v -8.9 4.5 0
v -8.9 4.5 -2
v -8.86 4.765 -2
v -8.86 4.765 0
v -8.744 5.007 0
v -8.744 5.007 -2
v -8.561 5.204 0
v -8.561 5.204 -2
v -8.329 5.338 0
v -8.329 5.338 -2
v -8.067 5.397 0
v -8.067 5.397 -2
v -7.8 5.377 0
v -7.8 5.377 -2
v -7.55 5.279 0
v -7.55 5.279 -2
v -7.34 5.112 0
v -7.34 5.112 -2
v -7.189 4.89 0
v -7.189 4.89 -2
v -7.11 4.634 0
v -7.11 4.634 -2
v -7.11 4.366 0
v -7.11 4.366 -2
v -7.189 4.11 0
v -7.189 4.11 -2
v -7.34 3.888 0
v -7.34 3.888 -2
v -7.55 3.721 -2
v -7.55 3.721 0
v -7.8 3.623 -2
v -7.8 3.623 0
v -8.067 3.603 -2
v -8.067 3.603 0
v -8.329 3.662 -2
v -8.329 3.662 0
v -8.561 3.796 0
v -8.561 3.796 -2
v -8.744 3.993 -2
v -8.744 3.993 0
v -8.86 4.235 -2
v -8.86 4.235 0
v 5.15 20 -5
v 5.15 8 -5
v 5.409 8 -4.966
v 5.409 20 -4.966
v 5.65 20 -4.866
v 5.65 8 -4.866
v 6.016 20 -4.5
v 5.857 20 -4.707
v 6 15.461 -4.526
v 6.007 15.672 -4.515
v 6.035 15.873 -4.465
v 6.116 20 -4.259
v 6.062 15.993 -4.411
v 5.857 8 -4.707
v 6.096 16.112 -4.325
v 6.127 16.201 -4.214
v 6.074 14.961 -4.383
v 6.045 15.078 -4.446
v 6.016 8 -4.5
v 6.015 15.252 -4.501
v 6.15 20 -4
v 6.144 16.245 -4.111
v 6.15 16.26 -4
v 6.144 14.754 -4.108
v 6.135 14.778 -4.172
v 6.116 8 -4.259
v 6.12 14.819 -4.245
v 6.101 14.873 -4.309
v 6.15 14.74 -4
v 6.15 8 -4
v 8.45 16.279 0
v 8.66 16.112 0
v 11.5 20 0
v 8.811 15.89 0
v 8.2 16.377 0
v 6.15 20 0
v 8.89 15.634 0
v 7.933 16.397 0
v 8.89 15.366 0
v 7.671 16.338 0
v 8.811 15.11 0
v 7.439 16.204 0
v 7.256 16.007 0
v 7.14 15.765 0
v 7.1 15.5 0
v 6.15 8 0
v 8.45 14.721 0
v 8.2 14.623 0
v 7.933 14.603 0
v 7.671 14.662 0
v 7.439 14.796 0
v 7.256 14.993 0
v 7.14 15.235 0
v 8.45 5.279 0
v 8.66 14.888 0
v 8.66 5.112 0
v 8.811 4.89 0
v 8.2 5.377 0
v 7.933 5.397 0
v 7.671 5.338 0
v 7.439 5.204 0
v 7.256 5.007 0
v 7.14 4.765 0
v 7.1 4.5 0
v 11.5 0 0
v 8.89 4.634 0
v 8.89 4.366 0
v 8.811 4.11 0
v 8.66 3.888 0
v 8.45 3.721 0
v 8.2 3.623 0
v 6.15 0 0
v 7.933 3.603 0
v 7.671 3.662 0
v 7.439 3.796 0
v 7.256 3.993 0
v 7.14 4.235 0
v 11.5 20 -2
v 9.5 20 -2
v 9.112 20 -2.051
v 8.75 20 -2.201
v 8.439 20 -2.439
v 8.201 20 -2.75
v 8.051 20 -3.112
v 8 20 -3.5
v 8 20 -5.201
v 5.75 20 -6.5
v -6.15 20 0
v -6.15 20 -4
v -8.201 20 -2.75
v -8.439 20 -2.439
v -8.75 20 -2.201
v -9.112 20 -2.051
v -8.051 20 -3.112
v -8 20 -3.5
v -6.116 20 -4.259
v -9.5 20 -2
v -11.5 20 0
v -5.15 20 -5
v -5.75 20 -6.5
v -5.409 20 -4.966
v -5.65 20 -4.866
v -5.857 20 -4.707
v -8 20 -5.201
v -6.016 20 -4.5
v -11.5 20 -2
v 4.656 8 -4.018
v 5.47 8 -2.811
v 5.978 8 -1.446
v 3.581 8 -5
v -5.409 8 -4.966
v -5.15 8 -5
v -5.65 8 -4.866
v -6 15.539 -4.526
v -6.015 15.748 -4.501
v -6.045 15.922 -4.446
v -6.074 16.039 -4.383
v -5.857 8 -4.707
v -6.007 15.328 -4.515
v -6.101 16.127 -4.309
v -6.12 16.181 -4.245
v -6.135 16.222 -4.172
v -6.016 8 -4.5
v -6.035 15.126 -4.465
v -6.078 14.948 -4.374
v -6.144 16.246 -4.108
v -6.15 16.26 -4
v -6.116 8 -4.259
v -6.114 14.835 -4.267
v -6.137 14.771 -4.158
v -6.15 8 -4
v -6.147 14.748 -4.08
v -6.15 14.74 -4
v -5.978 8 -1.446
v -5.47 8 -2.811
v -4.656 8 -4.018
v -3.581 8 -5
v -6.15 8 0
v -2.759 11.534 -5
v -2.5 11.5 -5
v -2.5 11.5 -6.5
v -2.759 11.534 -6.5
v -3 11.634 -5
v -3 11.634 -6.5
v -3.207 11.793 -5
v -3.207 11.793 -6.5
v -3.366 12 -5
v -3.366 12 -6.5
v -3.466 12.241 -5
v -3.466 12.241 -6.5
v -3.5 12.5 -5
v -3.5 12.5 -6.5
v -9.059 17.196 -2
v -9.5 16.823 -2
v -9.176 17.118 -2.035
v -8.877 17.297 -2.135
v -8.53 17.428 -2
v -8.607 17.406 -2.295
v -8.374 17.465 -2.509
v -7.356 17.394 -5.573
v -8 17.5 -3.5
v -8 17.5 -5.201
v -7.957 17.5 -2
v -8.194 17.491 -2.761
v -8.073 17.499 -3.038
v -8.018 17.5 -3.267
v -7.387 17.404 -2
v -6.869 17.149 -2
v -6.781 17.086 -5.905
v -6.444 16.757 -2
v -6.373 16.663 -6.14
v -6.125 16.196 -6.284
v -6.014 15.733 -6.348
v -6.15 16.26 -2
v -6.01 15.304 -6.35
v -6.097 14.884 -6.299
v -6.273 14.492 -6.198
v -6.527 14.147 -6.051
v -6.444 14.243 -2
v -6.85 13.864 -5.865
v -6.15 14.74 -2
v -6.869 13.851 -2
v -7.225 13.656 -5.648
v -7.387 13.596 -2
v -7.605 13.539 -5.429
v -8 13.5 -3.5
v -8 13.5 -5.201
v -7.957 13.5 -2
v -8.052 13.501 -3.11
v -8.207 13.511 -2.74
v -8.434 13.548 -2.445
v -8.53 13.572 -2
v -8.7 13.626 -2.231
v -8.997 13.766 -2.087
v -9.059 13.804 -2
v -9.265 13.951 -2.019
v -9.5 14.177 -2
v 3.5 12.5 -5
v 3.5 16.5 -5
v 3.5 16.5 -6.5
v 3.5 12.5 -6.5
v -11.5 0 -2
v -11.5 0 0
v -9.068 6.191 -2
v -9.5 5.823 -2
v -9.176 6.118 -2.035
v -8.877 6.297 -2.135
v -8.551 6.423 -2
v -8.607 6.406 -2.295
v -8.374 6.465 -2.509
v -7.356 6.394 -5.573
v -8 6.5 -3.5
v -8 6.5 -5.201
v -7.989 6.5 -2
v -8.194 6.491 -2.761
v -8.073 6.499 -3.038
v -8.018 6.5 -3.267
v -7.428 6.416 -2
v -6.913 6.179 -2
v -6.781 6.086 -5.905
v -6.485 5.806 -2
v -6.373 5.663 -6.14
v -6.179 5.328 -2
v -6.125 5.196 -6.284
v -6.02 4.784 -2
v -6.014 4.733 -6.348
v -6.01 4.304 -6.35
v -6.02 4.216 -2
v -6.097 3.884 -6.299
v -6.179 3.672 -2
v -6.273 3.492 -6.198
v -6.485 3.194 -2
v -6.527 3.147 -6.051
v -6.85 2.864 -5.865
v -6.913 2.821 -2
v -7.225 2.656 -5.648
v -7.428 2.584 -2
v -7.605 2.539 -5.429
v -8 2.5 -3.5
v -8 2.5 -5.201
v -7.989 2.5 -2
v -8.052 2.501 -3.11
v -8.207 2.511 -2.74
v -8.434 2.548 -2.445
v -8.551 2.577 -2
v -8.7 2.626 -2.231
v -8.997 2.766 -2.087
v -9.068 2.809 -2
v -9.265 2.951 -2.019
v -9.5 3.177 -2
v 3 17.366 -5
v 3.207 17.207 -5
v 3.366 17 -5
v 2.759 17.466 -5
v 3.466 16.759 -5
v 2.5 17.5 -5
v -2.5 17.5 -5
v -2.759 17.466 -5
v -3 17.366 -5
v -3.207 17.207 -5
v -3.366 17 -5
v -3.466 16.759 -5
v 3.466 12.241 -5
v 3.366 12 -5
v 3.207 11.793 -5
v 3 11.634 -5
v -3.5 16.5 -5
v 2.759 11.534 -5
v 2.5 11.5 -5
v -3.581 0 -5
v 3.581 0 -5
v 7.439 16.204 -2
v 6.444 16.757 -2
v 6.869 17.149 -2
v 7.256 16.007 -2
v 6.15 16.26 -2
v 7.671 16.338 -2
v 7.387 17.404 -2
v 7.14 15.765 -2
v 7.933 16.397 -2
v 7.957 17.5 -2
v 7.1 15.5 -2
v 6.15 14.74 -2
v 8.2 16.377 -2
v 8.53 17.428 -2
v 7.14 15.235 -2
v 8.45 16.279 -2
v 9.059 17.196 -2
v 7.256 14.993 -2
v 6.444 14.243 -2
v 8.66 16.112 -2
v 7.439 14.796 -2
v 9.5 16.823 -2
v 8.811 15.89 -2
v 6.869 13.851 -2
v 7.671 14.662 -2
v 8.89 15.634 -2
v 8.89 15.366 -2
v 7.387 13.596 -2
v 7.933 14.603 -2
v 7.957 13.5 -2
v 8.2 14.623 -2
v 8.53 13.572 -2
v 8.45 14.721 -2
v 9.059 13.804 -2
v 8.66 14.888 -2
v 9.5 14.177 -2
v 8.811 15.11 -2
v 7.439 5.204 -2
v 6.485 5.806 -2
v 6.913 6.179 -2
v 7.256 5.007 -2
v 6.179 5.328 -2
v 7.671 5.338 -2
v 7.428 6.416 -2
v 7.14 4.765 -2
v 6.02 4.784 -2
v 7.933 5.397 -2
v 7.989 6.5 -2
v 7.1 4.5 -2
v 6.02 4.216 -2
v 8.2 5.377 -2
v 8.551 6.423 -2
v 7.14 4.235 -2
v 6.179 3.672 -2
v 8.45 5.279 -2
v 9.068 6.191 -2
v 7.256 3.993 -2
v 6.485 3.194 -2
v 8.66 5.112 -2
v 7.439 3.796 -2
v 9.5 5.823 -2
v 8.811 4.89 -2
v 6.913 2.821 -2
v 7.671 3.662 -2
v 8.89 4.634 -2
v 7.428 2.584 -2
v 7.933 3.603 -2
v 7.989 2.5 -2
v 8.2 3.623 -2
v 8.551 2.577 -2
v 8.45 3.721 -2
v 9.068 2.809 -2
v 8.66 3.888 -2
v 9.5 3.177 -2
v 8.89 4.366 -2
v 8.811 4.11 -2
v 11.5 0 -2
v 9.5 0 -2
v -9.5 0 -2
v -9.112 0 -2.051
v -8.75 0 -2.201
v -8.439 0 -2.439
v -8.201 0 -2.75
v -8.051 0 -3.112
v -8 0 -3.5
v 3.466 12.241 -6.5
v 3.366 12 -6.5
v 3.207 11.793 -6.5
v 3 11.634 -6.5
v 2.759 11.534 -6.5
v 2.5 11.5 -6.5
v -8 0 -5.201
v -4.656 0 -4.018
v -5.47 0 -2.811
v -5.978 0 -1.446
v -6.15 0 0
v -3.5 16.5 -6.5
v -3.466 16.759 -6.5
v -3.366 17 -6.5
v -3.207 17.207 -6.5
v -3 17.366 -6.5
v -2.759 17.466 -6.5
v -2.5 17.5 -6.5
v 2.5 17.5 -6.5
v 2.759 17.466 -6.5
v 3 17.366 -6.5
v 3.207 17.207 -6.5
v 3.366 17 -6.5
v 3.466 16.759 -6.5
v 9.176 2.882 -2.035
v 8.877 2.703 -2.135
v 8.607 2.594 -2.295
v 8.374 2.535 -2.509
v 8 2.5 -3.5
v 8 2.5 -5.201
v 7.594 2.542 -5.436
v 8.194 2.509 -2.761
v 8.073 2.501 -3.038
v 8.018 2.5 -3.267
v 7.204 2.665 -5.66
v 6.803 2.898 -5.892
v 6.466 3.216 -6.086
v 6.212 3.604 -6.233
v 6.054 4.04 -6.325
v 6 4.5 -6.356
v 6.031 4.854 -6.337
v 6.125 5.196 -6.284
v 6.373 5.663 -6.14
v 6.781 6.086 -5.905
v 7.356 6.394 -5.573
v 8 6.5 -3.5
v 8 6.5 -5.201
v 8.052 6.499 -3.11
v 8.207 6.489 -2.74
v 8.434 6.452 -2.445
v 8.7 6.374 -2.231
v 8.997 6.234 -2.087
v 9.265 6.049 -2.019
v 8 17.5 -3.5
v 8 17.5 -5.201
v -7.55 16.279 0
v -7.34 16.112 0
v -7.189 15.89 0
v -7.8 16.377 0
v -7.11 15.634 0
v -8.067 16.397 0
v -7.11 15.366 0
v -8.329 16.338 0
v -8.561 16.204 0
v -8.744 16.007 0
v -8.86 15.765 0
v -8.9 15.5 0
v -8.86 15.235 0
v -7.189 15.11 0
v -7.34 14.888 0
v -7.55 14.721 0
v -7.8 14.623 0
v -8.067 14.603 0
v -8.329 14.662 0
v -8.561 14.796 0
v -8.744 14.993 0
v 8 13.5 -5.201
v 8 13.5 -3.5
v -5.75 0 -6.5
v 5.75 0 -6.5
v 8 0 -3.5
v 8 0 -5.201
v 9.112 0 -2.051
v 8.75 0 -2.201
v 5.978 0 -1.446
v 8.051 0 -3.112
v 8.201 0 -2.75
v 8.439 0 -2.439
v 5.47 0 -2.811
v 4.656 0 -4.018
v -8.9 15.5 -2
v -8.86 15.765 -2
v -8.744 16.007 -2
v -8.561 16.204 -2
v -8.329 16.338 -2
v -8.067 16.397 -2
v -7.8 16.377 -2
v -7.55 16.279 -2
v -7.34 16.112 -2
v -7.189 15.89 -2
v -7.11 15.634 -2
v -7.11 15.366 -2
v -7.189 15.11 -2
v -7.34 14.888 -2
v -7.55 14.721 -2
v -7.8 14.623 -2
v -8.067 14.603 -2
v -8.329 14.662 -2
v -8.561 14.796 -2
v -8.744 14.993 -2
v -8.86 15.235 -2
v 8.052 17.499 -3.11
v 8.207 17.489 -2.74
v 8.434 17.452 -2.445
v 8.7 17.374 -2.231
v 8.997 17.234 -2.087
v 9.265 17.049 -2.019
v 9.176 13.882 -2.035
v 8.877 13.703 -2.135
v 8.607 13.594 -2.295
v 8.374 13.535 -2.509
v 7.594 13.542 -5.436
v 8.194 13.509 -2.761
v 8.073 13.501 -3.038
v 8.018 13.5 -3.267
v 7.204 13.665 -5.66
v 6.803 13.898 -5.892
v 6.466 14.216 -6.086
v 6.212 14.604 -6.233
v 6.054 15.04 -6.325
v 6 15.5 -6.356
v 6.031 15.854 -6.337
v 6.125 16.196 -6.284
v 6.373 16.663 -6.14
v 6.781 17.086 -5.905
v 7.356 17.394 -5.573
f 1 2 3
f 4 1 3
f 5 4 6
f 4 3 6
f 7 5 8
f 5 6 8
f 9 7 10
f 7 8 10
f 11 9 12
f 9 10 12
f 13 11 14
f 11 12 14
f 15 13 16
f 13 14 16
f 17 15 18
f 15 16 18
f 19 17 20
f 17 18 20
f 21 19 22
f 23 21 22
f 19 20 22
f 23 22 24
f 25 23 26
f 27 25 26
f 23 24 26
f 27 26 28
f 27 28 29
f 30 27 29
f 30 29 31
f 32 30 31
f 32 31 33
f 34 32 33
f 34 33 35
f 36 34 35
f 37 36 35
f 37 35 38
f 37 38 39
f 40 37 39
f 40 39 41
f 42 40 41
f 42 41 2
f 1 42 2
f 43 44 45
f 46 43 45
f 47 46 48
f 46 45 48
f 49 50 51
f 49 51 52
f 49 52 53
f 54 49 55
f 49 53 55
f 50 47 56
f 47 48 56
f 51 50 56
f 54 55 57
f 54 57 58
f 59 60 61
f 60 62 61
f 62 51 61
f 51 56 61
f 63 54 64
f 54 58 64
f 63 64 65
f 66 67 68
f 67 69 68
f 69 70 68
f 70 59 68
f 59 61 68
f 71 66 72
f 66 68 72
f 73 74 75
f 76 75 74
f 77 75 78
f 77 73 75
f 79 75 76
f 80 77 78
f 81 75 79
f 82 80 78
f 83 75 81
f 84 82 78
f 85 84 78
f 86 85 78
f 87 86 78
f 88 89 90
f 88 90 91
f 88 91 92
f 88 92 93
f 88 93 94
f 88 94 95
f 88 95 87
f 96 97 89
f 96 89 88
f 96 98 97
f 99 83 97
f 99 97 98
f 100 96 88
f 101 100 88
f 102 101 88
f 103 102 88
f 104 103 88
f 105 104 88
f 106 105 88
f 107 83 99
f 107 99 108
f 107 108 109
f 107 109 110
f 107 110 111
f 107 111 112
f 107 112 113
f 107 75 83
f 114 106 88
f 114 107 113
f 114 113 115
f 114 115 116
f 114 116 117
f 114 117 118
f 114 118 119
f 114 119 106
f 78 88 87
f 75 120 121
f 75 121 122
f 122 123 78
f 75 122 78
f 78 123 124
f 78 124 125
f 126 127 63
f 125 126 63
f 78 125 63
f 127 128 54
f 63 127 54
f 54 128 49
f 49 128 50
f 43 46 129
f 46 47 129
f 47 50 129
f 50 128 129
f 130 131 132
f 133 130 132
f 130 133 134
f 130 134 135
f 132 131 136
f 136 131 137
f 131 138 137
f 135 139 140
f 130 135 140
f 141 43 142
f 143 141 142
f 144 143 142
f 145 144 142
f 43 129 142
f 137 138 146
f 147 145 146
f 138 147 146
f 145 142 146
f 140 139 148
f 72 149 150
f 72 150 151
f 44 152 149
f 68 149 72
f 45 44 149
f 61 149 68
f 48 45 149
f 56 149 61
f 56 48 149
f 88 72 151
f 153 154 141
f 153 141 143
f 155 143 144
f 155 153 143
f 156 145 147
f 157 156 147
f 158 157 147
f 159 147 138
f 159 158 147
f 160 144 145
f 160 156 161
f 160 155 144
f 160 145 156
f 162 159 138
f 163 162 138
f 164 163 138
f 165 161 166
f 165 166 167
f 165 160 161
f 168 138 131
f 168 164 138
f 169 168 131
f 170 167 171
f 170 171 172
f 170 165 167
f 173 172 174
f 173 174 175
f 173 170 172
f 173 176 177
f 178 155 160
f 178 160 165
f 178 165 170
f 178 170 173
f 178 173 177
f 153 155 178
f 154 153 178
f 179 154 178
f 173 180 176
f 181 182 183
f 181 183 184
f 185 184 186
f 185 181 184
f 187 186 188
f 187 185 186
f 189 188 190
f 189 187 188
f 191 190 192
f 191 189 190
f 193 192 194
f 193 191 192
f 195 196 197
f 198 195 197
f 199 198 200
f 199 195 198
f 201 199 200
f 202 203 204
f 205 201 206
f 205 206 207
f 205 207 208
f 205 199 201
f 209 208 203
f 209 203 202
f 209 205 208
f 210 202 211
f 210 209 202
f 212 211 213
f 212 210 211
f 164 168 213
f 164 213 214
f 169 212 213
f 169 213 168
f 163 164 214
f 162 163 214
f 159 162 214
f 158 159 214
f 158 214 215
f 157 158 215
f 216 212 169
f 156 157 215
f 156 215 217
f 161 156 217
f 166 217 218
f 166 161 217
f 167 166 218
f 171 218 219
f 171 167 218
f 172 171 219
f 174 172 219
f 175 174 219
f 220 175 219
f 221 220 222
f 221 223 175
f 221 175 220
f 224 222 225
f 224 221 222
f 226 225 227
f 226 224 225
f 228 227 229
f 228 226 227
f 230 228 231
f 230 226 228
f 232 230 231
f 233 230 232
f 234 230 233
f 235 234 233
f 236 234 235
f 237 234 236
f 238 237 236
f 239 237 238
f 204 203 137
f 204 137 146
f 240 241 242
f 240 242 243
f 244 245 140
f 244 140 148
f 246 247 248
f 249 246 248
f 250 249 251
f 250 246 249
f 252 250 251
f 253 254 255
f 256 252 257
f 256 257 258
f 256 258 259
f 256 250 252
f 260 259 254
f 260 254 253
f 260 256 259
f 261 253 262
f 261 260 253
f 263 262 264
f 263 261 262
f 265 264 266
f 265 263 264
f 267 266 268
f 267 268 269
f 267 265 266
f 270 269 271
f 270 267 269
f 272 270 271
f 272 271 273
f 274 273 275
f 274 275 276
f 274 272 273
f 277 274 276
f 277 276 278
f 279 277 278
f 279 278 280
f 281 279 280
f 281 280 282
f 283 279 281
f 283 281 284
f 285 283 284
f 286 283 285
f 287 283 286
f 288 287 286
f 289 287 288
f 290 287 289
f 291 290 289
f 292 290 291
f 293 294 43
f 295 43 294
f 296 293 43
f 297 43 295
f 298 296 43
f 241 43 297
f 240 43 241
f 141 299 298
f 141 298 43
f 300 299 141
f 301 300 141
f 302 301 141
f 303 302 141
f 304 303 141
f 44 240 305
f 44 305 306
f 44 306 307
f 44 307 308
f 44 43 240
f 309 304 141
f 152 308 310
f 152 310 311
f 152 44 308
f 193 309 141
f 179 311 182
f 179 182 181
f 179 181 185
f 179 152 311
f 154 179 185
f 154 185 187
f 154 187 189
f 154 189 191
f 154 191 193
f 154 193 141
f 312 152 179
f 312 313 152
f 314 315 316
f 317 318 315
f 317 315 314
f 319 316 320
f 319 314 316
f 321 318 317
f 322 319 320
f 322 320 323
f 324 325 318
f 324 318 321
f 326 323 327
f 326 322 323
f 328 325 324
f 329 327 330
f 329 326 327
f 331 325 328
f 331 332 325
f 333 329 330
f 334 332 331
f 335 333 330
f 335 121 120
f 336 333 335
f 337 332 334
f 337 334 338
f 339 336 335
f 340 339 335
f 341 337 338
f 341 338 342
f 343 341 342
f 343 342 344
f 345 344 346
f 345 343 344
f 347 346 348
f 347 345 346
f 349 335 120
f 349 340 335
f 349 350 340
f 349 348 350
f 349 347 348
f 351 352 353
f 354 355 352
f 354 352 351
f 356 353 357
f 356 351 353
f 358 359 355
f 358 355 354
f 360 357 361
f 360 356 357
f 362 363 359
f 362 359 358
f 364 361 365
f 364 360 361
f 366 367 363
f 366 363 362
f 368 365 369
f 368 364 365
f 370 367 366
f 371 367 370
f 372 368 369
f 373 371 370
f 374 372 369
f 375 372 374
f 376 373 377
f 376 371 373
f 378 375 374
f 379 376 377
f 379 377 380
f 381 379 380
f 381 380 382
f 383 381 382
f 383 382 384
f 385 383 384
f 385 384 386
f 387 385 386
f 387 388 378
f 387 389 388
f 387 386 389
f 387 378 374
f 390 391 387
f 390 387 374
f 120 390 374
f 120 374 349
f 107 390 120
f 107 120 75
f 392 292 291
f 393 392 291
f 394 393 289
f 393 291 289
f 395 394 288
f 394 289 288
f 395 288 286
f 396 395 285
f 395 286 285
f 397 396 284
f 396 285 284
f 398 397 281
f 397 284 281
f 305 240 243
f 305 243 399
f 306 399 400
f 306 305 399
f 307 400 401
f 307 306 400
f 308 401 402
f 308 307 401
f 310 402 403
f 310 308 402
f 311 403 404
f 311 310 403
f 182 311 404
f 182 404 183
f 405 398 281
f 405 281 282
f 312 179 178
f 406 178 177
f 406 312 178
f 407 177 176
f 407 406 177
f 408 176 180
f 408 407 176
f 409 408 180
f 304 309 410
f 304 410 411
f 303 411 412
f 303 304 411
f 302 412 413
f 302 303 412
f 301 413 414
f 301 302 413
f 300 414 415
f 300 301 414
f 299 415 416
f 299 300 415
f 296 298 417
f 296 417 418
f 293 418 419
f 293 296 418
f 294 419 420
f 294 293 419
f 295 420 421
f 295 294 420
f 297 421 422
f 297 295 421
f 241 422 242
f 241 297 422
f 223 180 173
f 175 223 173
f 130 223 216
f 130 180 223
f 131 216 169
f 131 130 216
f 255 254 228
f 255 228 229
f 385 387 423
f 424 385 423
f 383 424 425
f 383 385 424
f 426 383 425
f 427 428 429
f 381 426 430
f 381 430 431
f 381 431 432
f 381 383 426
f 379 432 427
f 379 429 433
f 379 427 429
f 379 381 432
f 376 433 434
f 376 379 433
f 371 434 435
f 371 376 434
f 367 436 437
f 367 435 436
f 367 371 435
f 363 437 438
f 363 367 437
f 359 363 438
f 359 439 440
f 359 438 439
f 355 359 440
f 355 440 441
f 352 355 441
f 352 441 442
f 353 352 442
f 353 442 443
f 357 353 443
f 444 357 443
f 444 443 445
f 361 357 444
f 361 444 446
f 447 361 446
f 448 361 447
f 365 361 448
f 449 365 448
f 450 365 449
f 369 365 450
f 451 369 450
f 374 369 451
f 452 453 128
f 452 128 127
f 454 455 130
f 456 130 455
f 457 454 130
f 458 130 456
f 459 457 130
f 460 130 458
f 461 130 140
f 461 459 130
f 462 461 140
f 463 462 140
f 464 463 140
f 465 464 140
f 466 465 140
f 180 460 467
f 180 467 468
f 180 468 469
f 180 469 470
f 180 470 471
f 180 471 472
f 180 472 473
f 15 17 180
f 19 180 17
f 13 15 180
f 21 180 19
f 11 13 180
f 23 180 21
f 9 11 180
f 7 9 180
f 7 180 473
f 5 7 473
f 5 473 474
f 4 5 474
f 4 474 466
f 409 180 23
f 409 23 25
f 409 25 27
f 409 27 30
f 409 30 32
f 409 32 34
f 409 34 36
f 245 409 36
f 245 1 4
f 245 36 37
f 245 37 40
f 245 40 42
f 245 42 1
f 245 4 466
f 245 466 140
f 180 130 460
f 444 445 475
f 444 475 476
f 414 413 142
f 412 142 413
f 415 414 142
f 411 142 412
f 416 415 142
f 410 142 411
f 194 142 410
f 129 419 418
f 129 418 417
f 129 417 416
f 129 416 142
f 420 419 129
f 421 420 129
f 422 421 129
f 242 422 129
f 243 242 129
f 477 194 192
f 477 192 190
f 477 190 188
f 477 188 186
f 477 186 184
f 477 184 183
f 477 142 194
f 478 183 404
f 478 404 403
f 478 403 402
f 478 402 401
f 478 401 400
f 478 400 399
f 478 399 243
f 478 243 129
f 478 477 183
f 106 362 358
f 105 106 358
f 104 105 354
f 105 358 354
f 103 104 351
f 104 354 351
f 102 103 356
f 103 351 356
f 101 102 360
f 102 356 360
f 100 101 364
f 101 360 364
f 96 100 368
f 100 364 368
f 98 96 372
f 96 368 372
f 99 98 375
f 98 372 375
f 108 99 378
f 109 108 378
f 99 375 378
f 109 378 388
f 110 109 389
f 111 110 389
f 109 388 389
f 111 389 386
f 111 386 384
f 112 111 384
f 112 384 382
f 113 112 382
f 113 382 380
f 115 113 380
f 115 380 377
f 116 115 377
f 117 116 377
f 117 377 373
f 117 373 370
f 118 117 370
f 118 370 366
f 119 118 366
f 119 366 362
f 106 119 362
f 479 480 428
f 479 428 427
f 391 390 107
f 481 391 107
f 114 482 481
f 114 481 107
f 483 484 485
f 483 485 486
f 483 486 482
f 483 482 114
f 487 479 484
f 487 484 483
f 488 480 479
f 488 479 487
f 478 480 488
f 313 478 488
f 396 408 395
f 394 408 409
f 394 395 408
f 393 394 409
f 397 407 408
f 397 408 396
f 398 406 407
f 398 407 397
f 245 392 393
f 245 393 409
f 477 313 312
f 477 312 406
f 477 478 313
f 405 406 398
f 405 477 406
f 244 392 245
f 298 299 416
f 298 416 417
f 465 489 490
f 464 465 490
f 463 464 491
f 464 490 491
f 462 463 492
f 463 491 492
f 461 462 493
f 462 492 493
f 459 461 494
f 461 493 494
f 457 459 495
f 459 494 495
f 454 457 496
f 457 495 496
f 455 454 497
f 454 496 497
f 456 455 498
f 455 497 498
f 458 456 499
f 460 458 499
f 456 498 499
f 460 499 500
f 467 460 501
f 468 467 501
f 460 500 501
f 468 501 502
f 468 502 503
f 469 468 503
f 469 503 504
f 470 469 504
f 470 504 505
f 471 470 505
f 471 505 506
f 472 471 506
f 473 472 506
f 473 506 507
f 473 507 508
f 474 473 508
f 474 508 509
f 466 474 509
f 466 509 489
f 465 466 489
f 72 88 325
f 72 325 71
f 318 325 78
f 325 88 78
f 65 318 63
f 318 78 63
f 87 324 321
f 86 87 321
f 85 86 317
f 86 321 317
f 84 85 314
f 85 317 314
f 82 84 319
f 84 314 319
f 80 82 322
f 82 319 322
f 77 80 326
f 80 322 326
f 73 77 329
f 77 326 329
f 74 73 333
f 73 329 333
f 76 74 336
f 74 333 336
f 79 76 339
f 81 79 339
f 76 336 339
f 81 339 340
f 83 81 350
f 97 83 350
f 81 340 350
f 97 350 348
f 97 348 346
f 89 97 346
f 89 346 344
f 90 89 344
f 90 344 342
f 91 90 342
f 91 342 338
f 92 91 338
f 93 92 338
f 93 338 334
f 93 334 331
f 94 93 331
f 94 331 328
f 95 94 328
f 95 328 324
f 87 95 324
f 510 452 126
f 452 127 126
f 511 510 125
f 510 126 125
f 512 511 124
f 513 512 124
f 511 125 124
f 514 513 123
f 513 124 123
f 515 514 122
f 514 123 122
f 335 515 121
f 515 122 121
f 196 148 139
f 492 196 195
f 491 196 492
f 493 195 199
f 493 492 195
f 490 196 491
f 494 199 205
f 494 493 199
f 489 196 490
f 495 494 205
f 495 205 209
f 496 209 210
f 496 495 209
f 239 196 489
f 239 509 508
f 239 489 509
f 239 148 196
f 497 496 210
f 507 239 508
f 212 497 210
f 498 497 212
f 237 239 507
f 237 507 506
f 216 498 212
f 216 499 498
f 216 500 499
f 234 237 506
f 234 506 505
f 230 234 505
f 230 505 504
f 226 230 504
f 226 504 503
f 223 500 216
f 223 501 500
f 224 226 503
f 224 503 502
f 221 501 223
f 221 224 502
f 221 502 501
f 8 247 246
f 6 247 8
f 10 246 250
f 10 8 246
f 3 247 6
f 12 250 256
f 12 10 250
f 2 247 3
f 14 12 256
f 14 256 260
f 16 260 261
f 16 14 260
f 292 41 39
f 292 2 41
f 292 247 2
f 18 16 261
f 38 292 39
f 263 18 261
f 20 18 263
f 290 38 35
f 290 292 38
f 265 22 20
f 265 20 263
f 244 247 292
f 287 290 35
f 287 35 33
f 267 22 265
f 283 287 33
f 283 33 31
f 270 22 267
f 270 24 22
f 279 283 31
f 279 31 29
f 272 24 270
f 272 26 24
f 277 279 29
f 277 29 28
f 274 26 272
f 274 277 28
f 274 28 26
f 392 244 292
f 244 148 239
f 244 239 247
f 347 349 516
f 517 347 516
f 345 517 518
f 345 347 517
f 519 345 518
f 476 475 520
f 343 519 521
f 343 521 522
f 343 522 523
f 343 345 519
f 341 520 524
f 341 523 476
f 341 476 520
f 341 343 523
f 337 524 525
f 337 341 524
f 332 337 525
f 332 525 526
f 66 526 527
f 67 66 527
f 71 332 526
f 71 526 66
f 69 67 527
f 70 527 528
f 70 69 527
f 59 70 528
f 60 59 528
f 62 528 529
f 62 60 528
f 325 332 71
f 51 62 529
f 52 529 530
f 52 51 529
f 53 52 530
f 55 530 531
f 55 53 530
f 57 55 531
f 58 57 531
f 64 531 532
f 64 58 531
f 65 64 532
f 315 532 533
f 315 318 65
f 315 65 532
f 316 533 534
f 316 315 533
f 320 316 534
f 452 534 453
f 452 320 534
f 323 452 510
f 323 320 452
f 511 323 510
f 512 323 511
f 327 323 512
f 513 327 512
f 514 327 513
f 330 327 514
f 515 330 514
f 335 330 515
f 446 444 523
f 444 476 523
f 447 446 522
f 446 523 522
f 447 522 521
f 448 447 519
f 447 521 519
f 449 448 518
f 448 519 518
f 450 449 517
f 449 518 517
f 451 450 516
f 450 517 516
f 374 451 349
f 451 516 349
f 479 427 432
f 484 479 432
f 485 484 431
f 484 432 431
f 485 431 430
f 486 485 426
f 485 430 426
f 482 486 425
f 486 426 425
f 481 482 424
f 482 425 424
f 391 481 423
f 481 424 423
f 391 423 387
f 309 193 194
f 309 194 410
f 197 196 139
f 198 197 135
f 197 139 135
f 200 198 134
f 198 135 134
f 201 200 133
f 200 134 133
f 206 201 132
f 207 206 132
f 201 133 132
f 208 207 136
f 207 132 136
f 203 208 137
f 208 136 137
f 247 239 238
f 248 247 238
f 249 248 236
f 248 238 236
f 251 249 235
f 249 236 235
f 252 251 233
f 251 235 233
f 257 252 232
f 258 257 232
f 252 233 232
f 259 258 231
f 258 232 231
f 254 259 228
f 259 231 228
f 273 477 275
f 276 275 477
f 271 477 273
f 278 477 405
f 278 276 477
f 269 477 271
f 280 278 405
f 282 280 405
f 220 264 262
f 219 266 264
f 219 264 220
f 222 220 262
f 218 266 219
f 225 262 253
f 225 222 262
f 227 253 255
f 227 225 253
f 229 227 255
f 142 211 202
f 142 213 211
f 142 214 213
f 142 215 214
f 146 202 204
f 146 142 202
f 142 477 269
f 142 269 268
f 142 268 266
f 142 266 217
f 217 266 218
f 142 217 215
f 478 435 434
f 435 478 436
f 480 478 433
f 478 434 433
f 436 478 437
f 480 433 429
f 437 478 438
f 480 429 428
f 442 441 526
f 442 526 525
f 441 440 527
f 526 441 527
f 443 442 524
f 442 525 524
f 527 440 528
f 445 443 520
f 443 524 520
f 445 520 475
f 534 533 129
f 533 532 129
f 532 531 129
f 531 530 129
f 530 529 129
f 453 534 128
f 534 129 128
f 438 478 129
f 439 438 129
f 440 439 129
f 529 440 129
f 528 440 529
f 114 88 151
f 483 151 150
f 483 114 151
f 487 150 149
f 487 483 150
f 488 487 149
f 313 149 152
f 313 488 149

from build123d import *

# Parameters (mm, degrees)
EXTRUDE_1_DEPTH     = 20
SKETCH_2_W          = 12.3
SKETCH_2_H          = 5
CUT_EXTRUDE_1_DEPTH = 12
FILLET_1_R          = 1
FILLET_2_R          = 1.5
CUT_EXTRUDE_5_DEPTH = 21
SKETCH_3_R          = 0.9
CUT_EXTRUDE_2_DEPTH = 8
SKETCH_4_R          = 2
CUT_EXTRUDE_3_DEPTH = 8
CUT_EXTRUDE_4_DEPTH = 8


with BuildPart() as part:
    # 草图1 → 凸台-拉伸1 (new body)
    with BuildSketch(Plane(origin=(0, 0, 0), x_dir=(1, 0, 0), z_dir=(0, 1, 0))):
        with BuildLine():
            Line((-6.15, 0), (-11.5, 0))
            Line((-11.5, 0), (-11.5, 2))
            Line((-11.5, 2), (-8, 2))
            Line((-8, 2), (-8, 6.5))
            Line((-8, 6.5), (8, 6.5))
            Line((8, 6.5), (8, 2))
            Line((8, 2), (11.5, 2))
            Line((11.5, 2), (11.5, 0))
            Line((11.5, 0), (6.15, 0))
            ThreePointArc((6.15, 0), (5.470134317, 2.810717088), (3.580851854, 5))
            Line((3.580851854, 5), (-3.580851854, 5))
            ThreePointArc((-3.580851854, 5), (-5.470134317, 2.810717088), (-6.15, 0))
        make_face()
    extrude(amount=EXTRUDE_1_DEPTH)

    # 草图2 → 切除-拉伸1 (cut)
    with BuildSketch(Plane(origin=(0, 20, 0), x_dir=(1, 0, 0), z_dir=(0, 1, 0))):
        with Locations((0, 2.5)):
            Rectangle(SKETCH_2_W, SKETCH_2_H)
    extrude(amount=-CUT_EXTRUDE_1_DEPTH, mode=Mode.SUBTRACT)

    # 圆角1
    fillet_1_edges = [part.edges().sort_by_distance(p)[0] for p in [
        (-6.15, 14, -5),
        (6.15, 14, -5),
    ]]
    fillet(fillet_1_edges, radius=FILLET_1_R)

    # 圆角2
    fillet_2_edges = [part.edges().sort_by_distance(p)[0] for p in [
        (-8, 10, -2),
        (8, 10, -2),
    ]]
    fillet(fillet_2_edges, radius=FILLET_2_R)

    # 草图6 → 切除-拉伸5 (cut, through all)
    with BuildSketch(Plane(origin=(0, 20, 0), x_dir=(1, 0, 0), z_dir=(0, 1, 0))):
        Polygon((-5.75, 6.5), (-8.528510242, 4.895826364), (-8.528510242, 6.5), align=None)
        Polygon((8.528510242, 6.5), (5.75, 6.5), (8.528510242, 4.895826364), align=None)
    extrude(amount=-CUT_EXTRUDE_5_DEPTH, mode=Mode.SUBTRACT)

    # 草图3 → 切除-拉伸2 (cut)
    with BuildSketch(Plane(origin=(0, 0, -6.5), x_dir=(-1, 0, 0), z_dir=(0, 0, -1))):
        with Locations((-8, 4.5)):
            Circle(SKETCH_3_R)
        with Locations((-8, 15.5)):
            Circle(SKETCH_3_R)
        with Locations((8, 15.5)):
            Circle(SKETCH_3_R)
        with Locations((8, 4.5)):
            Circle(SKETCH_3_R)
    extrude(amount=-CUT_EXTRUDE_2_DEPTH, mode=Mode.SUBTRACT)

    # 草图4 → 切除-拉伸3 (cut)
    with BuildSketch(Plane(origin=(0, 0, -2), x_dir=(-1, 0, 0), z_dir=(0, 0, -1))):
        with Locations((-8, 15.5)):
            Circle(SKETCH_4_R)
        with Locations((-8, 4.5)):
            Circle(SKETCH_4_R)
        with Locations((8, 15.5)):
            Circle(SKETCH_4_R)
        with Locations((8, 4.5)):
            Circle(SKETCH_4_R)
    extrude(amount=CUT_EXTRUDE_3_DEPTH, mode=Mode.SUBTRACT)

    # 草图5 → 切除-拉伸4 (cut)
    with BuildSketch(Plane.XY.offset(-5)):
        with BuildLine():
            Line((-2.5, 17.5), (2.5, 17.5))
            ThreePointArc((2.5, 17.5), (3.207106781, 17.207106781), (3.5, 16.5))
            Line((3.5, 16.5), (3.5, 12.5))
            ThreePointArc((3.5, 12.5), (3.207106781, 11.792893219), (2.5, 11.5))
            Line((2.5, 11.5), (-2.5, 11.5))
            ThreePointArc((-2.5, 11.5), (-3.207106781, 11.792893219), (-3.5, 12.5))
            Line((-3.5, 12.5), (-3.5, 16.5))
            ThreePointArc((-3.5, 16.5), (-3.207106781, 17.207106781), (-2.5, 17.5))
        make_face()
    extrude(amount=-CUT_EXTRUDE_4_DEPTH, mode=Mode.SUBTRACT)


solid = part.part
